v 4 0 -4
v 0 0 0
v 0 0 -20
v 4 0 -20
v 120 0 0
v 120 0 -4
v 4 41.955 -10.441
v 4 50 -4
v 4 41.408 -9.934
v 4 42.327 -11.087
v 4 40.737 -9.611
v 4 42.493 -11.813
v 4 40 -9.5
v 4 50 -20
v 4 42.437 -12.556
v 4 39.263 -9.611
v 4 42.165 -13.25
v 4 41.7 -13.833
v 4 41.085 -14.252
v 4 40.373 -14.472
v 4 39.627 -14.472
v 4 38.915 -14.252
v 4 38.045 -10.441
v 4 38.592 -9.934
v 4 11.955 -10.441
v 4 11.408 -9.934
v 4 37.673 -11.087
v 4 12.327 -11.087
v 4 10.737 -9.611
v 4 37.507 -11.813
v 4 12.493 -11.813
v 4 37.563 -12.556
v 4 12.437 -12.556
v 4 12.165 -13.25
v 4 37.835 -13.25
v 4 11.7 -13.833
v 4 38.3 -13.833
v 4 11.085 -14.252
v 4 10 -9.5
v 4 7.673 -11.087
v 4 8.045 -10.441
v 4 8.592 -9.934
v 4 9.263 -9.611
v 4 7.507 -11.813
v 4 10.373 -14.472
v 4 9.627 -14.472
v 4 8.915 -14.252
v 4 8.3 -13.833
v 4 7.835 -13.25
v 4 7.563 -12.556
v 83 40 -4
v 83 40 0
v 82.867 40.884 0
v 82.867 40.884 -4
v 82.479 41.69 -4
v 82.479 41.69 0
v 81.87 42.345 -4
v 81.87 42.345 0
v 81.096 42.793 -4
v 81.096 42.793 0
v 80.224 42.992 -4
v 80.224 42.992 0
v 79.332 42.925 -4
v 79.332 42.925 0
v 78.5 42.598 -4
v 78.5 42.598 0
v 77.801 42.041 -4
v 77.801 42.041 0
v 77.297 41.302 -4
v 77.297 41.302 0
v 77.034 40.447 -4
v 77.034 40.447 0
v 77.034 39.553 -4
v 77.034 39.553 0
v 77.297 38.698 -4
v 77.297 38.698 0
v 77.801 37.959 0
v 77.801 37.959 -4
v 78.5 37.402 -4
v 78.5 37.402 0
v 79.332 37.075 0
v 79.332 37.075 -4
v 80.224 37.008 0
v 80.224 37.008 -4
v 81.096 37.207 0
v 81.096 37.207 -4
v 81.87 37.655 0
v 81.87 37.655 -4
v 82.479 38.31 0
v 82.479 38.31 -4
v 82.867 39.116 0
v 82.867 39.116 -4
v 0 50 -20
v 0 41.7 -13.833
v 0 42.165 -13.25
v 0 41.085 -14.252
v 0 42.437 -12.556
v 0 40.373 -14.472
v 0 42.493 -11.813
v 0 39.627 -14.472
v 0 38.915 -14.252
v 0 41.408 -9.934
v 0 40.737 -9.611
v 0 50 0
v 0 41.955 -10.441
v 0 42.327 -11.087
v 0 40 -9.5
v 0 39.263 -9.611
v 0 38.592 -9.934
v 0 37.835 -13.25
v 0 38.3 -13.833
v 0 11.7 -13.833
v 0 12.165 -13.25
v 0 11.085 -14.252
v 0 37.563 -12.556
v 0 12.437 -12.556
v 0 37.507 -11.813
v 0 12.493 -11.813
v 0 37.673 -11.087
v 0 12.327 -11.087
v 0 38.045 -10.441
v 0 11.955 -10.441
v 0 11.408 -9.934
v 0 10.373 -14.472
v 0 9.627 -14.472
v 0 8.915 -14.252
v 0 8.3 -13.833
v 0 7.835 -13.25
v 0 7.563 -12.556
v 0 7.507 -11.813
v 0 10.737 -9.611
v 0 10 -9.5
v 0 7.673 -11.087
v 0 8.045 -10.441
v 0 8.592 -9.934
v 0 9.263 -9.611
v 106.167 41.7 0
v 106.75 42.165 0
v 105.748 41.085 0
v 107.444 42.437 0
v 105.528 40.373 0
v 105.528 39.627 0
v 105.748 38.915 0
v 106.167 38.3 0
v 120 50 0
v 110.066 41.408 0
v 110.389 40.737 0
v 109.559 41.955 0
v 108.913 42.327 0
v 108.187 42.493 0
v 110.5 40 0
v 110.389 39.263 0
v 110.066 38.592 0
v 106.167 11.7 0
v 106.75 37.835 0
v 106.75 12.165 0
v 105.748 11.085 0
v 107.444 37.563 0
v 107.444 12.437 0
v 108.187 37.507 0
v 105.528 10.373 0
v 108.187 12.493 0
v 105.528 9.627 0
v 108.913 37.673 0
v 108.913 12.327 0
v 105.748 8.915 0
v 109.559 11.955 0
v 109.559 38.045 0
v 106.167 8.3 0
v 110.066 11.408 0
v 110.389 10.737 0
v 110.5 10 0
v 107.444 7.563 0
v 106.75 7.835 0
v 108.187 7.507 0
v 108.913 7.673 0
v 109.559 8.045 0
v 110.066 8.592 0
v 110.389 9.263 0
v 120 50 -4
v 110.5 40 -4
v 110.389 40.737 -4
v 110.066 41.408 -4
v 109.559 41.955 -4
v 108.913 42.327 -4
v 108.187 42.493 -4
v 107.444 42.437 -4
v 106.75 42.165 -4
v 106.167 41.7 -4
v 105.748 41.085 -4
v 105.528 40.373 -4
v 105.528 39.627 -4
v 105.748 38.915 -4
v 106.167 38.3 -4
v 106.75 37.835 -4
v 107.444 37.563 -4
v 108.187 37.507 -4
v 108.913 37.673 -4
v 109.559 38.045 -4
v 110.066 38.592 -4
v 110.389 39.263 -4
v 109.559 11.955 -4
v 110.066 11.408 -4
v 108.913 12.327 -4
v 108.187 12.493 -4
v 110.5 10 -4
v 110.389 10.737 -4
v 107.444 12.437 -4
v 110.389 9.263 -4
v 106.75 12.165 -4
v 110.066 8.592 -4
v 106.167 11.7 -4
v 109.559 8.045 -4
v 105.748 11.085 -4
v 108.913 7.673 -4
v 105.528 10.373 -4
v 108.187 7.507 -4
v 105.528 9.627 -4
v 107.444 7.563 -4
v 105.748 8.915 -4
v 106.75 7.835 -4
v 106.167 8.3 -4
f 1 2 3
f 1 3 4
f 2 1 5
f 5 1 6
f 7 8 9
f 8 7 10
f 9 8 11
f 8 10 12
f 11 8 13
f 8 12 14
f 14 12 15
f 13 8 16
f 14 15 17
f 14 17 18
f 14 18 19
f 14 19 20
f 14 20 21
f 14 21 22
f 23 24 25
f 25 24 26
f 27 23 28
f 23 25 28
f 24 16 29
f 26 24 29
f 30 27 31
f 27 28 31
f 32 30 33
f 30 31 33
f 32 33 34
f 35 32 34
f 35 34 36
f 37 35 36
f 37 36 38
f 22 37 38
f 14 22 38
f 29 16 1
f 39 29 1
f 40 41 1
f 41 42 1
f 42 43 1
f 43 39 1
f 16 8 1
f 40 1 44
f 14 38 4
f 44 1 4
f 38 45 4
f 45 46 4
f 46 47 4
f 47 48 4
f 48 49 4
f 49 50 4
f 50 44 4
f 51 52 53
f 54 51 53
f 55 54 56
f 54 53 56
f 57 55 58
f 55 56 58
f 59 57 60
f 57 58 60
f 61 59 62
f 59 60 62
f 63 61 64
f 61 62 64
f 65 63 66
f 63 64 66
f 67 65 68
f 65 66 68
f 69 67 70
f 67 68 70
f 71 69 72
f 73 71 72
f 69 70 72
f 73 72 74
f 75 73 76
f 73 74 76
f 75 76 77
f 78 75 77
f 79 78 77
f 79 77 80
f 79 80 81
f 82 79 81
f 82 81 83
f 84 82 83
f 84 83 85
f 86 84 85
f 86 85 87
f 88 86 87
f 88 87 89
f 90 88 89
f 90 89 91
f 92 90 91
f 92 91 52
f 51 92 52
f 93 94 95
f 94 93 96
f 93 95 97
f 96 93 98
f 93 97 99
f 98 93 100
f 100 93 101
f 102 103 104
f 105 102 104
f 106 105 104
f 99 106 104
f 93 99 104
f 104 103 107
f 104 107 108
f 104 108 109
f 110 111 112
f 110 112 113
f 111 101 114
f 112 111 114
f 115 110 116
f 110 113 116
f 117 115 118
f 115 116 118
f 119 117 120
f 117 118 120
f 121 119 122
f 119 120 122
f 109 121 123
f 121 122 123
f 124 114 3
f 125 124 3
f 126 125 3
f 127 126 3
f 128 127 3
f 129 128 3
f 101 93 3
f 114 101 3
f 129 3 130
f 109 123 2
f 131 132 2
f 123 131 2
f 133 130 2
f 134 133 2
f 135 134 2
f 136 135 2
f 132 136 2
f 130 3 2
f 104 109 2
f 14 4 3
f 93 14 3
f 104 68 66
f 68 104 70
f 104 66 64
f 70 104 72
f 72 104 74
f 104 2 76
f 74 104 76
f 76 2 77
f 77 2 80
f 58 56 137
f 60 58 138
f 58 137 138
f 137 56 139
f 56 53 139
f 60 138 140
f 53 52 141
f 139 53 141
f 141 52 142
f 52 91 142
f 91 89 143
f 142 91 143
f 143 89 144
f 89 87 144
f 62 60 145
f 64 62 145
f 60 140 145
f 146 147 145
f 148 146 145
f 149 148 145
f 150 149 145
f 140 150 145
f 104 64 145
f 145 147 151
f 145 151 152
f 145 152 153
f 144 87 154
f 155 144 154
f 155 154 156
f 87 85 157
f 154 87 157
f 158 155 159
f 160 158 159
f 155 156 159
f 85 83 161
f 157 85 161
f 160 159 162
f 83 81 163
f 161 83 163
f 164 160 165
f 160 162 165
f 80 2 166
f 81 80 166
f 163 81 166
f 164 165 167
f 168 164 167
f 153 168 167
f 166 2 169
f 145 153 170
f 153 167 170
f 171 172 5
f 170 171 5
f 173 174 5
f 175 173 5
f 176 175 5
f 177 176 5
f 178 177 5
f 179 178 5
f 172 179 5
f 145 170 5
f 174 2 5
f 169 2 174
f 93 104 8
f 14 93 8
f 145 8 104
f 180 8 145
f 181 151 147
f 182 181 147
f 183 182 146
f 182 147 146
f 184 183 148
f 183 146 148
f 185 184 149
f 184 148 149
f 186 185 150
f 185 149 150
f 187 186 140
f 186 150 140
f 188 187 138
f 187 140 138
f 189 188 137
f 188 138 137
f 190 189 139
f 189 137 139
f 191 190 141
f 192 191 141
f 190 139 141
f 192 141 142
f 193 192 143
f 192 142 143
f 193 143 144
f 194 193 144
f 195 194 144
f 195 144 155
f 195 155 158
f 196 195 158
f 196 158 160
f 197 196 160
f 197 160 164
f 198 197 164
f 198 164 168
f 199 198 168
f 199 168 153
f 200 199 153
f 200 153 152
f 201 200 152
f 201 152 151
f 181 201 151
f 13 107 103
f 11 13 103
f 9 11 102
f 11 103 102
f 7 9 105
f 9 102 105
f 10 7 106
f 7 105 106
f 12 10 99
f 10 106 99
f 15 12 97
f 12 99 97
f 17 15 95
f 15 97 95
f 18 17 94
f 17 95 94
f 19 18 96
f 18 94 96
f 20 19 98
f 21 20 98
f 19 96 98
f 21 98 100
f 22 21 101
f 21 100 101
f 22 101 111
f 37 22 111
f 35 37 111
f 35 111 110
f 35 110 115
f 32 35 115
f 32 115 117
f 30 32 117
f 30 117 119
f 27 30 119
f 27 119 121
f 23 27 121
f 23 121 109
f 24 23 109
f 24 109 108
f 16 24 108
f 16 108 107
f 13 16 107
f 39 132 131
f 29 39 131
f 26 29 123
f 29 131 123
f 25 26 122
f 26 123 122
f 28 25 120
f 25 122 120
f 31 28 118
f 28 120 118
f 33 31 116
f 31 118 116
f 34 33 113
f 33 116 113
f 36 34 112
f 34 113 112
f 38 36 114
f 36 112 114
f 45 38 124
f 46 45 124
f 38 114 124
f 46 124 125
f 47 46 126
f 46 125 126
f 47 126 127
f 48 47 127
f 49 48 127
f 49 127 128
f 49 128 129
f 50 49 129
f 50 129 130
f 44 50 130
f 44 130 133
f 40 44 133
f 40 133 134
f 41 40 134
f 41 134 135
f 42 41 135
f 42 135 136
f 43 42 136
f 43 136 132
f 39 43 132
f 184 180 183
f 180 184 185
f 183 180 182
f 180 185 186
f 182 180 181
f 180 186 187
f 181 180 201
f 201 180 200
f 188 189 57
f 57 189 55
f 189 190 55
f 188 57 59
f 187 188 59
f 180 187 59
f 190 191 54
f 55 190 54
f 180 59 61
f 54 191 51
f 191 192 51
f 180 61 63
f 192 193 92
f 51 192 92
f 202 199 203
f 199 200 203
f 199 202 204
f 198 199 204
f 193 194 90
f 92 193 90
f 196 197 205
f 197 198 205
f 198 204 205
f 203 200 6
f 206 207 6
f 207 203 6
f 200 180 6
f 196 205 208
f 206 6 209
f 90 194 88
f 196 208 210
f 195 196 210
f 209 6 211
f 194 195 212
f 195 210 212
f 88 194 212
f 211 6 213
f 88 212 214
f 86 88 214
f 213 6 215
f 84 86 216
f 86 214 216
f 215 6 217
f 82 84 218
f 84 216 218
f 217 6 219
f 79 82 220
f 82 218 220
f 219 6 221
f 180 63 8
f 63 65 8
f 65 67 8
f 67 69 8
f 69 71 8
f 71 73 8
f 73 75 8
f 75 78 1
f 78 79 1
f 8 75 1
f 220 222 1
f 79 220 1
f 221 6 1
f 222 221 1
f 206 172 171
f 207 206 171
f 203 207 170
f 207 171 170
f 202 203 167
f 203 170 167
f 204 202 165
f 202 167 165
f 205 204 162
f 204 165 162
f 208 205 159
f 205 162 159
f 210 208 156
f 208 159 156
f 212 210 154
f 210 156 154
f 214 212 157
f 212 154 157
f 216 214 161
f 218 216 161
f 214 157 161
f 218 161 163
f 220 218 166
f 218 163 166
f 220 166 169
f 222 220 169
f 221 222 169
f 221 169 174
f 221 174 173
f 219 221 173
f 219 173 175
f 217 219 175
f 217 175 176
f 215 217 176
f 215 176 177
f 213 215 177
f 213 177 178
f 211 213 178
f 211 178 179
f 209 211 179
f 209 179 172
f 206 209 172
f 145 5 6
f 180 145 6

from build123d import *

# Parameters (mm, degrees)
EXTRUDE_1_DEPTH     = 50
SKETCH_2_R          = 2.5
CUT_EXTRUDE_1_DEPTH = 10
SKETCH_3_R          = 2.5
SKETCH_3_R_2        = 3
CUT_EXTRUDE_2_DEPTH = 10


with BuildPart() as part:
    # Эскиз1 → Бобышка-Вытянуть1 (new body)
    with BuildSketch(Plane(origin=(0, 0, 0), x_dir=(1, 0, 0), z_dir=(0, 1, 0))):
        Polygon((0, 0), (120, 0), (120, 4), (4, 4), (4, 20), (0, 20), (0, 4), align=None)
    extrude(amount=EXTRUDE_1_DEPTH)

    # Эскиз2 → Вырез-Вытянуть1 (cut)
    with BuildSketch(Plane.ZY):
        with Locations((-12, 40)):
            Circle(SKETCH_2_R)
        with Locations((-12, 10)):
            Circle(SKETCH_2_R)
    extrude(amount=-CUT_EXTRUDE_1_DEPTH, mode=Mode.SUBTRACT)

    # Эскиз3 → Вырез-Вытянуть2 (cut)
    with BuildSketch(Plane.XY):
        with Locations((108, 40)):
            Circle(SKETCH_3_R)
        with Locations((108, 10)):
            Circle(SKETCH_3_R)
        with Locations((80, 40)):
            Circle(SKETCH_3_R_2)
    extrude(amount=-CUT_EXTRUDE_2_DEPTH, mode=Mode.SUBTRACT)


solid = part.part
